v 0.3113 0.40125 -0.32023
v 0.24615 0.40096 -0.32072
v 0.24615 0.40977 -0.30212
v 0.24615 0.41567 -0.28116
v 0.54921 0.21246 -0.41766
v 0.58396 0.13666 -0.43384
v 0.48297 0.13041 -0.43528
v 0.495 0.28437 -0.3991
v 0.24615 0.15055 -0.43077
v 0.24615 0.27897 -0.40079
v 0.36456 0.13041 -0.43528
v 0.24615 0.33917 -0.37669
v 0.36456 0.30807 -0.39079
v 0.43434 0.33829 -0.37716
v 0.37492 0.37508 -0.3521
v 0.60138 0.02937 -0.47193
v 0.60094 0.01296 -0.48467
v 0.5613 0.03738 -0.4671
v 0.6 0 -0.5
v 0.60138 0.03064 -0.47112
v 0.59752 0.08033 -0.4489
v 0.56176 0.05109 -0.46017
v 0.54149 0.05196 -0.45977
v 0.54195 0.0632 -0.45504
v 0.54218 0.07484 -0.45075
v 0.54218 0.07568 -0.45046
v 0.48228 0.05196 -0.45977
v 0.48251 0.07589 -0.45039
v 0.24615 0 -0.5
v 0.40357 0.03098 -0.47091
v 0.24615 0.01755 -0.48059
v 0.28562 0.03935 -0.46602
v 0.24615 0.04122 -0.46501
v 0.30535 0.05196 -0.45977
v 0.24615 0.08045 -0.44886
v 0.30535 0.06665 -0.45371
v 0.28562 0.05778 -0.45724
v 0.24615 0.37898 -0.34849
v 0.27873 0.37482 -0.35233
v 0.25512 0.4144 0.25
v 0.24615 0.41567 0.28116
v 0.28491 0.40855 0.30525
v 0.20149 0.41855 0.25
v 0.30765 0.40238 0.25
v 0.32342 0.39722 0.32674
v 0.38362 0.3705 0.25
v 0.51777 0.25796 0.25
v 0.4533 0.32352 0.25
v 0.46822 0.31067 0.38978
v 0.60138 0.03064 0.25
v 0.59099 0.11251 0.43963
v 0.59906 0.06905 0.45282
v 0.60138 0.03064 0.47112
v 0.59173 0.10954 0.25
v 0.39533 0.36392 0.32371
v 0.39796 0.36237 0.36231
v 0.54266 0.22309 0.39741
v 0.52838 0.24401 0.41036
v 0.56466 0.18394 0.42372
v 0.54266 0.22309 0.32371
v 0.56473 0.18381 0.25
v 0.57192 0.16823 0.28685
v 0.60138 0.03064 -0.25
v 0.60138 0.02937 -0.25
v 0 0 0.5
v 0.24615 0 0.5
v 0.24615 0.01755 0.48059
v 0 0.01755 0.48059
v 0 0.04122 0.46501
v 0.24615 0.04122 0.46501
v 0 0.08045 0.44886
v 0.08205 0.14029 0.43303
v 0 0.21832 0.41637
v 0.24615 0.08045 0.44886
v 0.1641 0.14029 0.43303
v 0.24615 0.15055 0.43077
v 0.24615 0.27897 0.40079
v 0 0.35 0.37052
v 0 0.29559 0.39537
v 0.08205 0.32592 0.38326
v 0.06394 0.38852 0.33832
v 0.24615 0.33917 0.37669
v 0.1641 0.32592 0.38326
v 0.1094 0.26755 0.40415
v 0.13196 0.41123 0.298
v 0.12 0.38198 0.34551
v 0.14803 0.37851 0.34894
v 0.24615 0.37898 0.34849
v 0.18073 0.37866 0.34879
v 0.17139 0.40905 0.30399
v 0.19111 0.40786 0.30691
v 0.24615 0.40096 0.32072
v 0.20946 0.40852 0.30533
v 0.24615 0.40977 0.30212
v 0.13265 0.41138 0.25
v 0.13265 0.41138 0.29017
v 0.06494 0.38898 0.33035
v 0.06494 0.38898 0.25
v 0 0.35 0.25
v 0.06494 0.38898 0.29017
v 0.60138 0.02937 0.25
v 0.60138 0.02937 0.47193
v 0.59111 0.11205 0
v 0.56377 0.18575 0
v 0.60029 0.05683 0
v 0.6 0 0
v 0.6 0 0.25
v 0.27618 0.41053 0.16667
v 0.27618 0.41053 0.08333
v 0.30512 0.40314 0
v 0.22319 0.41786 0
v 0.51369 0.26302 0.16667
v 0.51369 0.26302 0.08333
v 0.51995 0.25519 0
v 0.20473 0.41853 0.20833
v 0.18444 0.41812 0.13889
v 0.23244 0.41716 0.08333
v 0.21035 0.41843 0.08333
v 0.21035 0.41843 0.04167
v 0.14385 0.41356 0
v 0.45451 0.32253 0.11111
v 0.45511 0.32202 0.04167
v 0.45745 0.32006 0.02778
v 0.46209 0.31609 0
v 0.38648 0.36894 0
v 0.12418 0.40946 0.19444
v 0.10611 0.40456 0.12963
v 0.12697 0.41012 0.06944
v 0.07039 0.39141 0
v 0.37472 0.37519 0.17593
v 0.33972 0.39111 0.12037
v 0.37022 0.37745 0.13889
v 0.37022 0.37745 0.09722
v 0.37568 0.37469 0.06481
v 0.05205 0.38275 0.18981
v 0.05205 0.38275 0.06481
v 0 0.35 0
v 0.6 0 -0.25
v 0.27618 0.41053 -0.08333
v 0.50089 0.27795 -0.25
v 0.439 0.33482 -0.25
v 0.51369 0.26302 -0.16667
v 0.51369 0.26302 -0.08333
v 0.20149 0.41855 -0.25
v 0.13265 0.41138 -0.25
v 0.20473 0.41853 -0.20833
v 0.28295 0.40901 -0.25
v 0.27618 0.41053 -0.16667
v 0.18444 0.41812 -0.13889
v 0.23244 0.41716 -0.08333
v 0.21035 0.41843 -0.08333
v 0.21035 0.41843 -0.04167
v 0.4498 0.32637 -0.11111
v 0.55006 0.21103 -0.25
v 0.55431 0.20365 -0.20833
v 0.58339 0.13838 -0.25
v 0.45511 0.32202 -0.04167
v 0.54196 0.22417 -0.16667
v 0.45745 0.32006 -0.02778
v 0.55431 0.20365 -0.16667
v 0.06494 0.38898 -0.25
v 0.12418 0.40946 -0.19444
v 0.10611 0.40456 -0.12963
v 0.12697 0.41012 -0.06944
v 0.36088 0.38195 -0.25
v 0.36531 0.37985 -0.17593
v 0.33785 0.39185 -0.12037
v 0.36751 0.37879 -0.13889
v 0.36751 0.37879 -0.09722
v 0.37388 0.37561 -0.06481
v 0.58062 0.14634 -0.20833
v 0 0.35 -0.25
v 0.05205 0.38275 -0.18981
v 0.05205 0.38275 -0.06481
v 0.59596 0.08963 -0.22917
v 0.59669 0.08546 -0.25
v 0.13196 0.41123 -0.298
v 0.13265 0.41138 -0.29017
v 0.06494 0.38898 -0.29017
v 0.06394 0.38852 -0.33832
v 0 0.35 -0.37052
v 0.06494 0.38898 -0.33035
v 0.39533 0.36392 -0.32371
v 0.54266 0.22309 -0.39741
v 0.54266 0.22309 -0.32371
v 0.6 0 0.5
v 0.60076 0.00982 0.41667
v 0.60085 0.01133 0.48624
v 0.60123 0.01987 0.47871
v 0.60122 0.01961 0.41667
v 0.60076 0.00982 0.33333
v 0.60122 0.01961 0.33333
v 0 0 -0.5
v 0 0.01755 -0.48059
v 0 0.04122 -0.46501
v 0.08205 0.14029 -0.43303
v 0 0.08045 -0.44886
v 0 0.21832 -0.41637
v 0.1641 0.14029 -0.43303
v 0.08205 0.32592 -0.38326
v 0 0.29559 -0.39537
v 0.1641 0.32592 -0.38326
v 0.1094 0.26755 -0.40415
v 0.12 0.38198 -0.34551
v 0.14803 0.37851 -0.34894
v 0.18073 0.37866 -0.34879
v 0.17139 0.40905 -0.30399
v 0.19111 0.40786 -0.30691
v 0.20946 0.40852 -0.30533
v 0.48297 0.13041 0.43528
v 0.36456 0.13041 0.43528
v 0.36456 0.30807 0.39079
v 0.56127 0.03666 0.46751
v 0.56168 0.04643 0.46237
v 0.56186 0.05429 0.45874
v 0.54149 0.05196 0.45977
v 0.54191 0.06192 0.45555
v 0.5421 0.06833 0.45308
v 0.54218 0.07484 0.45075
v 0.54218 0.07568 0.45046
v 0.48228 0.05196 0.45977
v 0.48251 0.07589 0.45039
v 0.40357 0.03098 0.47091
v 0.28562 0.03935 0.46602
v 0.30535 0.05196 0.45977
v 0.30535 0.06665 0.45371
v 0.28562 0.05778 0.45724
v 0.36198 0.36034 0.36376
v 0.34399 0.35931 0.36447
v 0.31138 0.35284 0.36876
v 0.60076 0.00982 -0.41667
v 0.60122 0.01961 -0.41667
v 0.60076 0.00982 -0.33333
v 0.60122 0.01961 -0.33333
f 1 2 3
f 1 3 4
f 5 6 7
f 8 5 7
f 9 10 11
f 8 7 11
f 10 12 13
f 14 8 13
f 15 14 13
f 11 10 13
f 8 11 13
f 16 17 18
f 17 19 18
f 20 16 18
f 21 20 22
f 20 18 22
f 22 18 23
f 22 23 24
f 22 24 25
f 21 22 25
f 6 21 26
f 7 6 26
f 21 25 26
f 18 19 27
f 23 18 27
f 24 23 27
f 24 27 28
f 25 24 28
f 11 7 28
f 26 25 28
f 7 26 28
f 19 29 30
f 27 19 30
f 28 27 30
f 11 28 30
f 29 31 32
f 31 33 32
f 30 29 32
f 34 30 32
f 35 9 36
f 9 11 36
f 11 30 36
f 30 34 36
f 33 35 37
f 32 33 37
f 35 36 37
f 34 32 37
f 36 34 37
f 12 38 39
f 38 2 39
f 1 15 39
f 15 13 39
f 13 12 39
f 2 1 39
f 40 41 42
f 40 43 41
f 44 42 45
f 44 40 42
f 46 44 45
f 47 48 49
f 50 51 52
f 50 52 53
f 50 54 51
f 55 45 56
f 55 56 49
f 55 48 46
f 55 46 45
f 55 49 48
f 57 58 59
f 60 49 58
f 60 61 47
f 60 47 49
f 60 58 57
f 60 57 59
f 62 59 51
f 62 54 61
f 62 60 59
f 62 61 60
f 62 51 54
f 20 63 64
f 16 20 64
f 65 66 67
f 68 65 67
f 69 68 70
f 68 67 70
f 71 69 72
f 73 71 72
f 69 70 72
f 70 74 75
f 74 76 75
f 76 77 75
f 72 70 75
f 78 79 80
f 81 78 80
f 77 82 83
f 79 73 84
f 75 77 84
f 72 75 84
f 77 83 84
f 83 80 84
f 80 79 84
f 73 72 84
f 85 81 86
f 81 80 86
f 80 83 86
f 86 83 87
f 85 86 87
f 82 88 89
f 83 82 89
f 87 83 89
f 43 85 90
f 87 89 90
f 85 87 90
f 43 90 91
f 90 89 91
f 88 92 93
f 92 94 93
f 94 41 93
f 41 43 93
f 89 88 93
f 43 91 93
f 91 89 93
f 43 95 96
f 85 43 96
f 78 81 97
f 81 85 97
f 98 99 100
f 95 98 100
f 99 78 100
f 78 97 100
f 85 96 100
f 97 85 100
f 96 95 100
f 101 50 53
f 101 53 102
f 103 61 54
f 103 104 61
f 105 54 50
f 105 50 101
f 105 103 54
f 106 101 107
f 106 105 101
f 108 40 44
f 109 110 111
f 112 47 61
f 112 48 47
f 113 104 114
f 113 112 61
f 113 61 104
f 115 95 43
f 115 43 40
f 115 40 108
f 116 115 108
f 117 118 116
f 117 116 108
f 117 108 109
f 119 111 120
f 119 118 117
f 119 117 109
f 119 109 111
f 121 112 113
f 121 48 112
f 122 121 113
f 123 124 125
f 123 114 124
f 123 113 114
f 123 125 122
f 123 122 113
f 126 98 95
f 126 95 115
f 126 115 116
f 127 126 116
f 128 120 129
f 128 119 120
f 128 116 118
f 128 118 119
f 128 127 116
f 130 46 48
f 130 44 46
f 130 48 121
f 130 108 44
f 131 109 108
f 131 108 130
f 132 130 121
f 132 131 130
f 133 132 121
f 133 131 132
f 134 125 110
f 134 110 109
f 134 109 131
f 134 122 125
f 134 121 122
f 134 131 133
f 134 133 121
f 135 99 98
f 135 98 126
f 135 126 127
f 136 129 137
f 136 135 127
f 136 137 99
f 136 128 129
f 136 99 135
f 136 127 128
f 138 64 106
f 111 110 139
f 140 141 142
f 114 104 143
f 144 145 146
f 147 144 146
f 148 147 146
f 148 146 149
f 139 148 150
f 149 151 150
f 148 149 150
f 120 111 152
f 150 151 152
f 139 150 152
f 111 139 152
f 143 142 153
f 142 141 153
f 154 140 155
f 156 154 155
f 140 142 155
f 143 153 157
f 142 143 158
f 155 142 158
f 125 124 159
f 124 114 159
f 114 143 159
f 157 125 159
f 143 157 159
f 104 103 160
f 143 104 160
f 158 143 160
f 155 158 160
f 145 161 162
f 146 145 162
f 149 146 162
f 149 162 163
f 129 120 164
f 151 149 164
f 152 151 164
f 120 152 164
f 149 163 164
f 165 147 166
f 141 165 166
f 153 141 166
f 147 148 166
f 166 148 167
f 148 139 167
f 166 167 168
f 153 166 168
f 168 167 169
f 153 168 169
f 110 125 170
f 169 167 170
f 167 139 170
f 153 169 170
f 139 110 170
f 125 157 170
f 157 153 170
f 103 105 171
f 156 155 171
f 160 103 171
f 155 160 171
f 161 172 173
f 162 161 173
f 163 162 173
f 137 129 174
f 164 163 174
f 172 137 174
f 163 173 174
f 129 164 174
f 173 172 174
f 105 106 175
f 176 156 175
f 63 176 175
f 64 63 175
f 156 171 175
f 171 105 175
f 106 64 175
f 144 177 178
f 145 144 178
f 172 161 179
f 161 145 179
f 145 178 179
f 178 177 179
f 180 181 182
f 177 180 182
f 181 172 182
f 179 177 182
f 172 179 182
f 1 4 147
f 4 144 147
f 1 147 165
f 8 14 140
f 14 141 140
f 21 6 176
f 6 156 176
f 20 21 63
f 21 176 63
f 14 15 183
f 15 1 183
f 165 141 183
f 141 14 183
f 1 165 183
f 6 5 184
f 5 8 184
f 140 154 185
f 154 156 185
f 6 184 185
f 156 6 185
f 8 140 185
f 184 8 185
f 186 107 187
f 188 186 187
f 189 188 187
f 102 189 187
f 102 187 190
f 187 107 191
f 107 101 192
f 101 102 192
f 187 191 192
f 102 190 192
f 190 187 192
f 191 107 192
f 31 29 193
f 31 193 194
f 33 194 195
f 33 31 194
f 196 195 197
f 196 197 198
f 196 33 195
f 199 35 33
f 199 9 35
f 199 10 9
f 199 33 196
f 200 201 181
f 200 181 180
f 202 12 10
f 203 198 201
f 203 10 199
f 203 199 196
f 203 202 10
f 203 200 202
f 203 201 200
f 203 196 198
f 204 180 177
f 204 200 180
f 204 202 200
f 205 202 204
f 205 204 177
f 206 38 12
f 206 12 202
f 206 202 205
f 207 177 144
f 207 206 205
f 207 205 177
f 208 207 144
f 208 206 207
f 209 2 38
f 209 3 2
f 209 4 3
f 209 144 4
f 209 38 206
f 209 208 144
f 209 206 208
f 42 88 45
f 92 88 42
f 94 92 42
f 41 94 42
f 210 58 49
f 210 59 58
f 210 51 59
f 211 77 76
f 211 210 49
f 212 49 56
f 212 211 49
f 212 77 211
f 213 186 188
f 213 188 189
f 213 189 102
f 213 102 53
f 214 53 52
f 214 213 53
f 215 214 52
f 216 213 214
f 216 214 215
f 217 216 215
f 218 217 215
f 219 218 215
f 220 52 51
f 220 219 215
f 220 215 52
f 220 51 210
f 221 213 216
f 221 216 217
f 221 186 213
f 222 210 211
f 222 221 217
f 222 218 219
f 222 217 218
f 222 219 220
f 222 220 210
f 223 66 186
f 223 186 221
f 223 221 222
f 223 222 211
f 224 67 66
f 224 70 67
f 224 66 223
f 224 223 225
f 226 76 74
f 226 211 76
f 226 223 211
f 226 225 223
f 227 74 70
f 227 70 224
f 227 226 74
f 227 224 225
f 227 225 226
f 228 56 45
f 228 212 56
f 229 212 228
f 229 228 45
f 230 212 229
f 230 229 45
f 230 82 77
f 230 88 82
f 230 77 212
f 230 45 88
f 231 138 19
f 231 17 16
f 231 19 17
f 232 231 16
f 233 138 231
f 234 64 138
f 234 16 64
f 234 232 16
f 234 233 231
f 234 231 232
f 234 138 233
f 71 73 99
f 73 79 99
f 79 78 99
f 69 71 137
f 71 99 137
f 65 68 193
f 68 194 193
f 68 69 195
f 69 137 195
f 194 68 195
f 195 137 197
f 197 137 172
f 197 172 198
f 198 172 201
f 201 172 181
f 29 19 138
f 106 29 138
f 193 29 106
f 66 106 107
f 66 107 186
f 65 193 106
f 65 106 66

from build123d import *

# Parameters (mm, degrees)
BOSS_EXTRUDE1_DEPTH     = 0.25
BOSS_EXTRUDE2_START     = -0.246147001
BOSS_EXTRUDE2_DEPTH     = 0.246147001
BOSS_EXTRUDE2_START_2   = 0.246147001
BOSS_EXTRUDE2_2_DEPTH   = 0.355236273
BOSS_EXTRUDE2_START_3   = 0.25
BOSS_EXTRUDE2_3_DEPTH   = 1.75
CUT_EXTRUDE1_DEPTH      = 1.887043447
CUT_EXTRUDE1_DEPTH_BACK = 1.887043447


with BuildPart() as part:
    # Sketch1 → Boss-Extrude1 (new, symmetric)
    with BuildSketch(Plane.XY):
        with BuildLine():
            Line((0, 0.35), (0, 0))
            Line((0, 0), (0.6, 0))
            add(Edge.make_bspline(
                [(0, 0.35), (0.257985516, 0.5453908), (0.626819788, 0.289928398), (0.6, 0)],
                knots=[0, 0, 0, 0, 1, 1, 1, 1], degree=3))
        make_face()
    extrude(amount=BOSS_EXTRUDE1_DEPTH, both=True)

    # Boss-Extrude2: read off the stored shape, not the designer's step
    # Boss-Extrude2 outline → Boss-Extrude2 (add)
    with BuildSketch(Plane.ZY.offset(BOSS_EXTRUDE2_START)):
        with BuildLine():
            Line((0.25, 0), (0.5, 0))
            add(Edge.make_bspline(
                [(0.5, 0), (0.39086499, 0.071490544), (0.458561007, 0.418548902), (0.25, 0.418548902)],
                knots=[0, 0, 0, 0, 1, 1, 1, 1], degree=3))
            Line((0.25, 0.418548902), (0.25, 0))
        make_face()
    boss_extrude2 = extrude(amount=BOSS_EXTRUDE2_DEPTH)

    # Boss-Extrude2 2 outline → Boss-Extrude2 2 (add)
    with BuildSketch(Plane.YZ.offset(BOSS_EXTRUDE2_START_2)):
        with BuildLine():
            add(Edge.make_bspline(
                [(0, 0.5), (0.071490544, 0.39086499), (0.418548902, 0.458561007), (0.418548902, 0.25)],
                knots=[0, 0, 0, 0, 1, 1, 1, 1], degree=3))
            Line((0, 0.5), (0, 0.25))
            Line((0, 0.25), (0.418548902, 0.25))
        make_face()
    boss_extrude2_2 = extrude(amount=BOSS_EXTRUDE2_2_DEPTH)

    # Boss-Extrude2 3 outline → Boss-Extrude2 3 (cut)
    with BuildSketch(Plane.XY.offset(BOSS_EXTRUDE2_START_3)):
        with BuildLine():
            Line((0.601383274, 0.418548902), (0.201485184, 0.418548902))
            add(Edge.make_bspline(
                [(0.201485184, 0.418548902), (0.404568721, 0.4185489), (0.600980368, 0.237363776), (0.601383274, 0.030644082)],
                knots=[0.70274, 0.70274, 0.70274, 0.70274, 1.423102498, 1.423102498, 1.423102498, 1.423102498], degree=3))
            Line((0.601383274, 0.030644082), (0.601383274, 0.418548902))
        make_face()
        with BuildLine():
            Line((0.601383274, 0), (0.601383274, 0.029369833))
            add(Edge.make_bspline(
                [(0.6, 0), (0.600909788, 0.009835023), (0.601364288, 0.019630385), (0.601383274, 0.029369833)],
                knots=[0, 0, 0, 0, 0.033922248, 0.033922248, 0.033922248, 0.033922248], degree=3))
            Line((0.6, 0), (0.601383274, 0))
        make_face()
    boss_extrude2_3 = extrude(amount=BOSS_EXTRUDE2_3_DEPTH, mode=Mode.SUBTRACT)

    # Mirror1: Boss-Extrude2, Boss-Extrude2 2, Boss-Extrude2 3 across plane
    add(boss_extrude2.mirror(Plane.XY))
    add(boss_extrude2_2.mirror(Plane.XY))
    add(boss_extrude2_3.mirror(Plane.XY), mode=Mode.SUBTRACT)

    # Sketch3 → Cut-Extrude1 (cut, two sides: drawn at the far end of the back side and taken through both)
    with BuildSketch(Plane.XY.offset(-CUT_EXTRUDE1_DEPTH_BACK)):
        with BuildLine():
            Line((0, 0.418548902), (0, 0.35))
            add(Edge.make_bspline(
                [(0.201485181, 0.418548902), (0.132630672, 0.418548902), (0.063009218, 0.397721367), (0, 0.35)],
                knots=[0.755764514, 0.755764514, 0.755764514, 0.755764514, 1, 1, 1, 1], degree=3))
            Line((0.201485181, 0.418548902), (0, 0.418548902))
        make_face()
    extrude(amount=CUT_EXTRUDE1_DEPTH + CUT_EXTRUDE1_DEPTH_BACK, mode=Mode.SUBTRACT)


solid = part.part
